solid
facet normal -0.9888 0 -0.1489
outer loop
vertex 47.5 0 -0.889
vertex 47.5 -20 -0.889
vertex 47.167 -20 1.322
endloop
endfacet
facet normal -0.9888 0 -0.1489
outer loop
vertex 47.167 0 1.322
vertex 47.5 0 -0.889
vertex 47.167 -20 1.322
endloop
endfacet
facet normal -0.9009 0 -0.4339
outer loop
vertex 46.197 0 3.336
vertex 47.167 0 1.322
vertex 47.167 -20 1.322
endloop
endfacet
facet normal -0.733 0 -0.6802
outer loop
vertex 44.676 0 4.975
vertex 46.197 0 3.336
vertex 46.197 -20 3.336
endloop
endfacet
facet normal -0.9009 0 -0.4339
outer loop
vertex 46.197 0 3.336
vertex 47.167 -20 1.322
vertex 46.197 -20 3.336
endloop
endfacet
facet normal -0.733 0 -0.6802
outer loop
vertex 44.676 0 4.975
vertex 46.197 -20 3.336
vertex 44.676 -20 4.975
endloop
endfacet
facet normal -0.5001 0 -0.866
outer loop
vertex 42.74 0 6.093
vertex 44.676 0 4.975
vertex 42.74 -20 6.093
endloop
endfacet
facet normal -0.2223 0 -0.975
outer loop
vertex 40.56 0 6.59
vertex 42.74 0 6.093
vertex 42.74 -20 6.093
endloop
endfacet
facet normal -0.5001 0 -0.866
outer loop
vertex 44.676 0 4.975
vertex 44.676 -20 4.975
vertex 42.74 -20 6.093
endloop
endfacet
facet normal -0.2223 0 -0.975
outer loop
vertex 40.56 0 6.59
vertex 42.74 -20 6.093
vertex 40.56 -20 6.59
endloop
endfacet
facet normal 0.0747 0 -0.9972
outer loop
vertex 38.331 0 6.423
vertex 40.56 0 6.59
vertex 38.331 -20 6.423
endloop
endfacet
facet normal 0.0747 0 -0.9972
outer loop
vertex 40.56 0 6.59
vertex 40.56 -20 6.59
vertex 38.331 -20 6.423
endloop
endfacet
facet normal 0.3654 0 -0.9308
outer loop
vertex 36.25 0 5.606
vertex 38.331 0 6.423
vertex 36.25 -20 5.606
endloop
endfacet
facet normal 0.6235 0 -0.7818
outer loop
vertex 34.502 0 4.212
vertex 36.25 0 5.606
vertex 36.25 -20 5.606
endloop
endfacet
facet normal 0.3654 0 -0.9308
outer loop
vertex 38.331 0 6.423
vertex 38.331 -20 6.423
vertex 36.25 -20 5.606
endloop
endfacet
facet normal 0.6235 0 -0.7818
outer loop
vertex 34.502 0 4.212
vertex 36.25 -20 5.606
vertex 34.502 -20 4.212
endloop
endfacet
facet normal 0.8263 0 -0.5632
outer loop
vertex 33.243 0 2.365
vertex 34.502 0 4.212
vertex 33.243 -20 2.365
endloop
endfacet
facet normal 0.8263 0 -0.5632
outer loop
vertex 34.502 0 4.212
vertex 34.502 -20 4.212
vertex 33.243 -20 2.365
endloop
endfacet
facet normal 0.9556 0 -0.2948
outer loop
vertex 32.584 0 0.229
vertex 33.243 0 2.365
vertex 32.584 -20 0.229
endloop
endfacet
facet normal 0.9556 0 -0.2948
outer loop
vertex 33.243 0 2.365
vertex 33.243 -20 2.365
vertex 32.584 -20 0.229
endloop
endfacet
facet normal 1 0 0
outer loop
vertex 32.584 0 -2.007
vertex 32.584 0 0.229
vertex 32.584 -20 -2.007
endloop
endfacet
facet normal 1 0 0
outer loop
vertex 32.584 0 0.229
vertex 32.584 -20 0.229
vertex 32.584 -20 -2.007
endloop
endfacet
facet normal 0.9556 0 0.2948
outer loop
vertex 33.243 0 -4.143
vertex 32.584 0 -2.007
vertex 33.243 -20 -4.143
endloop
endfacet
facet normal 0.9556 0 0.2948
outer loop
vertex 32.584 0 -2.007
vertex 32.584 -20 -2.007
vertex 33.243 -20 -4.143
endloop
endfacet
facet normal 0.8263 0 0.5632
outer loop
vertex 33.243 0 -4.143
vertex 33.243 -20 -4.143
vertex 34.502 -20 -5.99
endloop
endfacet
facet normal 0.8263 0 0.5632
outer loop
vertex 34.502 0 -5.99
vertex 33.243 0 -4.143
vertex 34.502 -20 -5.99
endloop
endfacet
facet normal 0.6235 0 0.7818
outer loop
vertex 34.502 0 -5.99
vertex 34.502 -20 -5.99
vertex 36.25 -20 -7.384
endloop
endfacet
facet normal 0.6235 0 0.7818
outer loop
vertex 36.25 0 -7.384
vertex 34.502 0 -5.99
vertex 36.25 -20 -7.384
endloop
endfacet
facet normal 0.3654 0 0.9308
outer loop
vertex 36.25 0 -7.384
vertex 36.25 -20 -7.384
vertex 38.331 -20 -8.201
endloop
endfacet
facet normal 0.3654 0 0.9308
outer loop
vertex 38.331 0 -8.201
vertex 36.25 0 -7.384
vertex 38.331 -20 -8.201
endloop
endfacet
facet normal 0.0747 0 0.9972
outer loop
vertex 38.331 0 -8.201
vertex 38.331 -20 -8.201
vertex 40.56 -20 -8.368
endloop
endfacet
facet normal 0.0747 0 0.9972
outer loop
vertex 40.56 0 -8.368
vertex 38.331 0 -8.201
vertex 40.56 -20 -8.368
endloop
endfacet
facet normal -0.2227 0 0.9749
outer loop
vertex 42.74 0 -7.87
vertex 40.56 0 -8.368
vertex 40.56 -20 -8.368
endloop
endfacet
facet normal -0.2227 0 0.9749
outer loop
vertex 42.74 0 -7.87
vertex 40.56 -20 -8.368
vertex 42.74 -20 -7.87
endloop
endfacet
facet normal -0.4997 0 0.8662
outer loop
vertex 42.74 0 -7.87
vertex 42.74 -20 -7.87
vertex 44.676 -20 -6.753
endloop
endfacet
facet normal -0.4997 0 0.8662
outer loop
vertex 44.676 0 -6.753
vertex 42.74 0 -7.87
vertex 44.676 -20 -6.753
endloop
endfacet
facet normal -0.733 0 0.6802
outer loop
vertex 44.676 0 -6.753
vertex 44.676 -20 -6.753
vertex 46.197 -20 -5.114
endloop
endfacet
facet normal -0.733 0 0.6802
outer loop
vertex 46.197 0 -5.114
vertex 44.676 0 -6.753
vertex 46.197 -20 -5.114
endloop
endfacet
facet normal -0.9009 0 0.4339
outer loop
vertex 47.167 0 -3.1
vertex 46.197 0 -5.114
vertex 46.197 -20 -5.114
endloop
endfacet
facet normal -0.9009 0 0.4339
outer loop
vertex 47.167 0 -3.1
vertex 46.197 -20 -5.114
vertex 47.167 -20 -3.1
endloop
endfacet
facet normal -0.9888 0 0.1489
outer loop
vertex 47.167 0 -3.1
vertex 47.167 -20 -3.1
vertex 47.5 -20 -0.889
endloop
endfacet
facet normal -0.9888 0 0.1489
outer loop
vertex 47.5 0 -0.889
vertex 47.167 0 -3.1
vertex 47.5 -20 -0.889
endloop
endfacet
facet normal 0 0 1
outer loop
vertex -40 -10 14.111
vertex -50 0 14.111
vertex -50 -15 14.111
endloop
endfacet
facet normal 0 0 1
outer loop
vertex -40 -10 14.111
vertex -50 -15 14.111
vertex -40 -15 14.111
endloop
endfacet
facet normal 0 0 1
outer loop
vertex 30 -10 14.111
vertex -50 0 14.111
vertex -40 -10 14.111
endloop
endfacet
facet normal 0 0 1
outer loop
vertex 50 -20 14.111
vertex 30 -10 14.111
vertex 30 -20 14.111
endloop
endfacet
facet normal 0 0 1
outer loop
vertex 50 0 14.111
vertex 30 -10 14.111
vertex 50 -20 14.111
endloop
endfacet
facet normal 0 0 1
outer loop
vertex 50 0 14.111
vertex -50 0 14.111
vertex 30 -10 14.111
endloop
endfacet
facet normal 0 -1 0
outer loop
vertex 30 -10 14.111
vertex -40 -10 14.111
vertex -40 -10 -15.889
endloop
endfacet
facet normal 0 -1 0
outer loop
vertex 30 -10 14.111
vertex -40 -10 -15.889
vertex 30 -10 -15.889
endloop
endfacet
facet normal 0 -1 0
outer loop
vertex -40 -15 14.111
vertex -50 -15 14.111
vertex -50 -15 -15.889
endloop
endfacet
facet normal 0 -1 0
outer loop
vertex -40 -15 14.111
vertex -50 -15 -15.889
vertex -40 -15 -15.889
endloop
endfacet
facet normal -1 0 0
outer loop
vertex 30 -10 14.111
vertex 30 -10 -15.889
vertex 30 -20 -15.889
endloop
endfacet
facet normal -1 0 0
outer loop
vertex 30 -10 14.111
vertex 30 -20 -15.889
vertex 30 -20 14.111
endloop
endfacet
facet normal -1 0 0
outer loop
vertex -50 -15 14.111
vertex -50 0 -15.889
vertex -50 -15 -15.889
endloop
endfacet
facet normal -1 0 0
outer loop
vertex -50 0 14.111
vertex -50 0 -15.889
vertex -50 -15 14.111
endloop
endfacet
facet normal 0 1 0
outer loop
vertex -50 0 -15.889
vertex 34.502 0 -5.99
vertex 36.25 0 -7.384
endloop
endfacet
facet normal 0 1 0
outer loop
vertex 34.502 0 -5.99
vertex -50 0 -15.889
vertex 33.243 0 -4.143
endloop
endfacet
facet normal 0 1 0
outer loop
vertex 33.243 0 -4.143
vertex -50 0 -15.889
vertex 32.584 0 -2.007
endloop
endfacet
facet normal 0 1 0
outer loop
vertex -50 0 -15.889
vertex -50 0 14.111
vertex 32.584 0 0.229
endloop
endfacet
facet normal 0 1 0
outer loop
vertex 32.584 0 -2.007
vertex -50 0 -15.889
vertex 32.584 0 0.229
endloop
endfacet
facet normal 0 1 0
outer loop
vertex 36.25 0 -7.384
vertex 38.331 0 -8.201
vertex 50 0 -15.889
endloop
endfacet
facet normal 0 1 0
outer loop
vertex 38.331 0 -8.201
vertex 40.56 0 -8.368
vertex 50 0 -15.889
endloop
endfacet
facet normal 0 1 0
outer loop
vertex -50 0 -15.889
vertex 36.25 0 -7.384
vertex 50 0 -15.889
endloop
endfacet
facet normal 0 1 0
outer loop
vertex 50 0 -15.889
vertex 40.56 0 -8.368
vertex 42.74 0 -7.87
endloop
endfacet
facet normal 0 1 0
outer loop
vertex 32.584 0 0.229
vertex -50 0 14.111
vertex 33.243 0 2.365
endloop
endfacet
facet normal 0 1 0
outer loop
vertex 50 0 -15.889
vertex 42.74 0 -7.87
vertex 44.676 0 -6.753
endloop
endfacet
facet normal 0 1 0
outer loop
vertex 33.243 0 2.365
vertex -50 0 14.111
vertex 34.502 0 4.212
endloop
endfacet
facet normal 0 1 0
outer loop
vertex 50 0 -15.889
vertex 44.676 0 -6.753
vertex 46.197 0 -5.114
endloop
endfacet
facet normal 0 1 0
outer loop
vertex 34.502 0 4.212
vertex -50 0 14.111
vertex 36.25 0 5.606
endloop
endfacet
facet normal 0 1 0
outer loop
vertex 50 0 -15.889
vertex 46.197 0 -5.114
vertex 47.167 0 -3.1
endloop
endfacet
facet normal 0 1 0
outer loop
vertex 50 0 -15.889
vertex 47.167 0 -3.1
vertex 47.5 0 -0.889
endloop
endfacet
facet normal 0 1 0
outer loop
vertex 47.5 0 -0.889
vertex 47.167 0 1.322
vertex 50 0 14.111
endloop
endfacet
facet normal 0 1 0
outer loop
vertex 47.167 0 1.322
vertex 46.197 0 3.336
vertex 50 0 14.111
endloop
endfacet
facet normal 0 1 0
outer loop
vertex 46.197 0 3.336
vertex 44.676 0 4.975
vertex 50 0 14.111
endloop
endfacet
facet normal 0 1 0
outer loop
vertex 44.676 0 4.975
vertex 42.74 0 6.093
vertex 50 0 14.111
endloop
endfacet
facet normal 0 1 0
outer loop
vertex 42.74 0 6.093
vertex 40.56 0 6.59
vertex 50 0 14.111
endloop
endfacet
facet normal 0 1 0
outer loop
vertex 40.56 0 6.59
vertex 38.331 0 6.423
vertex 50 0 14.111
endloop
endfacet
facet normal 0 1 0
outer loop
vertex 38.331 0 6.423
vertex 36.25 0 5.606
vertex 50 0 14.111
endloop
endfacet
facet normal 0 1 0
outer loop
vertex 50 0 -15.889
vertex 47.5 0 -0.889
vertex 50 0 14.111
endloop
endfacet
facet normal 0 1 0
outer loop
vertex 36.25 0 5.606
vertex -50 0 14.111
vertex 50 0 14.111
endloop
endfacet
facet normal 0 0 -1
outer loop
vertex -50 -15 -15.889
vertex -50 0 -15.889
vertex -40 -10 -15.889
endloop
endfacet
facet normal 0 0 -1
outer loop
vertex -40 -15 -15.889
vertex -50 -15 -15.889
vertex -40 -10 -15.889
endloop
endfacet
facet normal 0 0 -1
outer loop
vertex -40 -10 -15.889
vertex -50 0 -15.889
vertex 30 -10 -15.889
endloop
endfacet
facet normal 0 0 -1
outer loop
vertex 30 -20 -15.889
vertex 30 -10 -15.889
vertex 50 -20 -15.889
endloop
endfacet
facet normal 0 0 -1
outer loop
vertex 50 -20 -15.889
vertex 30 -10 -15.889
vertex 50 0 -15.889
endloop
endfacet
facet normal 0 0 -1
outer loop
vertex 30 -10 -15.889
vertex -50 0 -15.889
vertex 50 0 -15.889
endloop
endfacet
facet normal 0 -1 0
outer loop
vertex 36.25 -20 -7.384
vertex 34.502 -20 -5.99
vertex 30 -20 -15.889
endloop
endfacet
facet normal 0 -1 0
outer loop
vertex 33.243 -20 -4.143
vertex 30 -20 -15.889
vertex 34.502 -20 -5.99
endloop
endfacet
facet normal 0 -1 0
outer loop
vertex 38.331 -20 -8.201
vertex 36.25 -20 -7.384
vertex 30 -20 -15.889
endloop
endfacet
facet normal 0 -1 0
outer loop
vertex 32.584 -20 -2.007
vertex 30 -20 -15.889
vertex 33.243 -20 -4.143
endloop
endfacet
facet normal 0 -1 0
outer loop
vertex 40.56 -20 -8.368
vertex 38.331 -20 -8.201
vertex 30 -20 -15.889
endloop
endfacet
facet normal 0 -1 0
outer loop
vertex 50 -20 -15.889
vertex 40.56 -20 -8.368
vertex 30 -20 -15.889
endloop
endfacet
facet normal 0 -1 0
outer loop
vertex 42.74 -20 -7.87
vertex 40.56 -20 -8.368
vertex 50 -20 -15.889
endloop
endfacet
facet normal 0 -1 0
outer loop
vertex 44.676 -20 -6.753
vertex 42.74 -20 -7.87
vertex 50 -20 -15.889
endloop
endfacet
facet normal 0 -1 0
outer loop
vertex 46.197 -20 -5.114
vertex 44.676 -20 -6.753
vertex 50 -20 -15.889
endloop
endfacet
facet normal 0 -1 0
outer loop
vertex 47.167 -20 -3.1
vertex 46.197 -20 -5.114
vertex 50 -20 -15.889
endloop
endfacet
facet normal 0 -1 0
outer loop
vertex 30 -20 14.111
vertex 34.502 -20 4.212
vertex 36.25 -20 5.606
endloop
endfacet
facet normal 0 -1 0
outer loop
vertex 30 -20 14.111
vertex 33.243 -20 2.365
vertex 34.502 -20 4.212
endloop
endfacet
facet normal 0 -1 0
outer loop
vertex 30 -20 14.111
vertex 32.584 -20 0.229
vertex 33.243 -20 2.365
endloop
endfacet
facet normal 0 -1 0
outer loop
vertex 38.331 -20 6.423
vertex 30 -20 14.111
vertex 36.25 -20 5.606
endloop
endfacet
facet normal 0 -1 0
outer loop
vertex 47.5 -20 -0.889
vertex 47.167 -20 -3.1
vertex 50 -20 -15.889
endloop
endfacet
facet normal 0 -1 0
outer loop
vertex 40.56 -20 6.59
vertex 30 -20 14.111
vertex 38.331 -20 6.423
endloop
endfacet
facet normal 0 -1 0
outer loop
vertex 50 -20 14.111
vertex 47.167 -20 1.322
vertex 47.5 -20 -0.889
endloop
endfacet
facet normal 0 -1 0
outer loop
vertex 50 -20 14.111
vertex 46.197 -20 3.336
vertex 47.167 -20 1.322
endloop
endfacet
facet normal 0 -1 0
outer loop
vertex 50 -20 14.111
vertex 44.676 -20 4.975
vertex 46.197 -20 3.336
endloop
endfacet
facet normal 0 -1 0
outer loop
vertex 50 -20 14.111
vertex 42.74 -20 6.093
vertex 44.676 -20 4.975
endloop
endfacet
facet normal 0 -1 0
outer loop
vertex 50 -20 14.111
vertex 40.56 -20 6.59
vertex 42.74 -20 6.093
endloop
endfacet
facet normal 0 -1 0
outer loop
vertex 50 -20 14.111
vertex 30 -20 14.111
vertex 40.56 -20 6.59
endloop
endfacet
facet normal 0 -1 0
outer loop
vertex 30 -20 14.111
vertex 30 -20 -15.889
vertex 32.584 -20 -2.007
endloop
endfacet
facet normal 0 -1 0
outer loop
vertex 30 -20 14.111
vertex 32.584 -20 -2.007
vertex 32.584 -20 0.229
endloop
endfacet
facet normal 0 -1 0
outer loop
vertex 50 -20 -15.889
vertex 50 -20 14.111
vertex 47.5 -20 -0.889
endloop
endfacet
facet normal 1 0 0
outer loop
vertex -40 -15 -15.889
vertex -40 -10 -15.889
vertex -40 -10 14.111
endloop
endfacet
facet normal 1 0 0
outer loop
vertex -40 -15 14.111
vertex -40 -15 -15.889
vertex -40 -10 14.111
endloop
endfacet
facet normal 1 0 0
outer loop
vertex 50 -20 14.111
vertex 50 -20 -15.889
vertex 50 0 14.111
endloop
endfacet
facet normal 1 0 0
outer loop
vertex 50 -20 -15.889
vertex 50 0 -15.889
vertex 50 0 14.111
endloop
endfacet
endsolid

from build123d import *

# Parameters (mm, degrees)
F0_W     = 100
F0_H     = 30
F1_DEPTH = 10
F2_W     = 10
F2_H     = 30
F3_DEPTH = 5
F4_W     = 20
F4_H     = 30
F5_DEPTH = 10
F6_R     = 7.5
F7_DEPTH = 20.001


with BuildPart() as f1:
    # F0 (on Front) → F1 (new body)
    with BuildSketch(Plane.XZ):
        with Locations((0, -0.888889)):
            Rectangle(F0_W, F0_H)
    extrude(amount=F1_DEPTH)

    # F2 (on face) → F3 (join)
    with BuildSketch(Plane.XZ.offset(10)):
        with Locations((-45, -0.888889)):
            Rectangle(F2_W, F2_H)
    extrude(amount=F3_DEPTH)

    # F4 (on face) → F5 (join)
    with BuildSketch(Plane.XZ.offset(10)):
        with Locations((40, -0.888889)):
            Rectangle(F4_W, F4_H)
    extrude(amount=F5_DEPTH)

    # F6 (on face) → F7 (cut, through all)
    with BuildSketch(Plane.XZ.offset(20)):
        with Locations((40, -0.888889)):
            Circle(F6_R)
    extrude(amount=-F7_DEPTH, mode=Mode.SUBTRACT)


solid = f1.part
